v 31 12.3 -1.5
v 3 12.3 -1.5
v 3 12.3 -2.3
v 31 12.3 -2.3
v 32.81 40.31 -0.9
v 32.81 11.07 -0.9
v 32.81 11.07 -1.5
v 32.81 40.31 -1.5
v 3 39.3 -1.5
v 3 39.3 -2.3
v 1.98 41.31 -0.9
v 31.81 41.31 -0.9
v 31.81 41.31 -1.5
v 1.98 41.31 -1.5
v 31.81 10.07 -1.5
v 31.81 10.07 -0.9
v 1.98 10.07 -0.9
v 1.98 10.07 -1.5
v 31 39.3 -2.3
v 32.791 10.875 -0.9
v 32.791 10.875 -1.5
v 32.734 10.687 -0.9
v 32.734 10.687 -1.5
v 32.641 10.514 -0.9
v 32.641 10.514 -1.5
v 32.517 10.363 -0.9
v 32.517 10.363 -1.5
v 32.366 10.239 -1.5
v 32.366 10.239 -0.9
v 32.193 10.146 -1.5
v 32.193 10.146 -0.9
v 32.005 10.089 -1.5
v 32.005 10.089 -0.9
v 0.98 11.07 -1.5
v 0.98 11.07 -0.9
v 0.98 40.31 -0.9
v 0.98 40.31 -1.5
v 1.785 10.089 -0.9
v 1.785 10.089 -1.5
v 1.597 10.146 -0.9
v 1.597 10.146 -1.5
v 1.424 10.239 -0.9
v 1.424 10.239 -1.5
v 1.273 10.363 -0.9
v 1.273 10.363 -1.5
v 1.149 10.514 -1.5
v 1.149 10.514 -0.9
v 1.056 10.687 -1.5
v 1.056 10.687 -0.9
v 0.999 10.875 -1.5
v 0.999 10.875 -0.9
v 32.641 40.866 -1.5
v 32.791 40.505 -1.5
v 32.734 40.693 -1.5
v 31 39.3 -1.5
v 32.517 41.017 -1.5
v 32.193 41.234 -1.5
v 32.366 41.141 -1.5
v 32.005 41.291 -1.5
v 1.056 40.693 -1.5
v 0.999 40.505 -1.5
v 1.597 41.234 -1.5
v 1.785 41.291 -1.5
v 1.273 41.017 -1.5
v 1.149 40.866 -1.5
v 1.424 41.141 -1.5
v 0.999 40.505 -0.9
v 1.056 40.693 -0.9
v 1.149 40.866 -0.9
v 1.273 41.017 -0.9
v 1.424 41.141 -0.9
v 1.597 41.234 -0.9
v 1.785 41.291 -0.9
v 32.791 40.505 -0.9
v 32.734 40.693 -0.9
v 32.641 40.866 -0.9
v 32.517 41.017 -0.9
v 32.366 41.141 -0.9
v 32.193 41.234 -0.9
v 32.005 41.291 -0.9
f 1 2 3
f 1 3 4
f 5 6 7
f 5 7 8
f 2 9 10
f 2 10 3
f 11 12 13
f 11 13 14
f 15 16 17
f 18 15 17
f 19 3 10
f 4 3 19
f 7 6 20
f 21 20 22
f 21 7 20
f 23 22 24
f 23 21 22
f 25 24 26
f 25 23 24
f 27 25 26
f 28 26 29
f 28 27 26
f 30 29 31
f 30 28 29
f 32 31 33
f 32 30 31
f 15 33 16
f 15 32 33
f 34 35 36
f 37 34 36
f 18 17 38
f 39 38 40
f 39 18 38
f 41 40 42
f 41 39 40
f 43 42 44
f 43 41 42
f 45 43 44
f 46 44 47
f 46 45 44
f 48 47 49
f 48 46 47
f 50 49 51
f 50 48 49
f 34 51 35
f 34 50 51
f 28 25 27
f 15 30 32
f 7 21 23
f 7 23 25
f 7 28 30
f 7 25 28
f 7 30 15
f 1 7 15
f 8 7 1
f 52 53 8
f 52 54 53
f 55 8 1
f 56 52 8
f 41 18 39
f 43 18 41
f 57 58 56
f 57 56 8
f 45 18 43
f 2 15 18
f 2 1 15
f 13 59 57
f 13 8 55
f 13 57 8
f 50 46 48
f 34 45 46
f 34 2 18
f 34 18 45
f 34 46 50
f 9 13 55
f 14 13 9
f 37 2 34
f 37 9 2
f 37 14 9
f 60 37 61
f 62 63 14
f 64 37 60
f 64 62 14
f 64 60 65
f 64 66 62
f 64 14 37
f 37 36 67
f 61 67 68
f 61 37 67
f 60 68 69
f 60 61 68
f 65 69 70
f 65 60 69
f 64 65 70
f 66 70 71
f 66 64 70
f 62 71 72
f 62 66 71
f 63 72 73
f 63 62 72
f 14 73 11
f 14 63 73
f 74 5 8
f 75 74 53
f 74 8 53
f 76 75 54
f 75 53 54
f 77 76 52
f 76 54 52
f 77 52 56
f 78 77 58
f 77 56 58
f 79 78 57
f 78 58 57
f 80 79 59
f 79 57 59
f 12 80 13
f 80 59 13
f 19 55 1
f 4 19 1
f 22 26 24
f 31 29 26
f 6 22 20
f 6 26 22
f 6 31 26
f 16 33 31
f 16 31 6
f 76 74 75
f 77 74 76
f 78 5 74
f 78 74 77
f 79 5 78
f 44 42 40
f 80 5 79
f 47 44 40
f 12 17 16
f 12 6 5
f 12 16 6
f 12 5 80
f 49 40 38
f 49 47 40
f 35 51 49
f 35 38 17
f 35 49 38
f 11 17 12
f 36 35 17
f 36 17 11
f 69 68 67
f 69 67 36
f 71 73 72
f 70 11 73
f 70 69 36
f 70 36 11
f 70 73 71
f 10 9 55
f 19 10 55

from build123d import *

# Parameters (mm, degrees)
SKETCH_W     = 31.83
SKETCH_H     = 31.24
PAD_DEPTH    = 1.5
FILLET_R     = 1
POCKET_DEPTH = 0.9
SKETCH028_W  = 28
SKETCH028_H  = 27
PAD021_DEPTH = 0.8


with BuildPart() as part:
    # Sketch → Pad (new body)
    with BuildSketch(Plane(origin=(0, 0, 0), x_dir=(-1, 0, 0), z_dir=(0, 0, -1))):
        with Locations((-16.895, 25.69)):
            Rectangle(SKETCH_W, SKETCH_H)
    extrude(amount=PAD_DEPTH)

    # Fillet
    fillet_edges = [part.edges().sort_by_distance(p)[0] for p in [
        (32.81, 41.31, -0.75),
        (0.98, 41.31, -0.75),
        (0.98, 10.07, -0.75),
        (32.81, 10.07, -0.75),
    ]]
    fillet(fillet_edges, radius=FILLET_R)

    # Fillet Face2 → Pocket (cut)
    with BuildSketch(Plane(origin=(16.895, 25.69, 0), x_dir=(0, 1, 0), z_dir=(0, 0, 1))):
        with BuildLine():
            Line((15.62, -14.915), (15.62, 14.915))
            ThreePointArc((15.62, 14.915), (15.327107, 15.622107), (14.62, 15.915))
            Line((14.62, 15.915), (-14.62, 15.915))
            ThreePointArc((-14.62, 15.915), (-15.327107, 15.622107), (-15.62, 14.915))
            Line((-15.62, 14.915), (-15.62, -14.915))
            ThreePointArc((-15.62, -14.915), (-15.327107, -15.622107), (-14.62, -15.915))
            Line((-14.62, -15.915), (14.62, -15.915))
            ThreePointArc((14.62, -15.915), (15.327107, -15.622107), (15.62, -14.915))
        make_face()
    extrude(amount=-POCKET_DEPTH, mode=Mode.SUBTRACT)

    # Sketch028 (on Face4 of Pocket) → Pad021 (join)
    with BuildSketch(Plane(origin=(0, 0, -1.5), x_dir=(1, 0, 0), z_dir=(0, 0, -1))):
        with Locations((17, -25.8)):
            Rectangle(SKETCH028_W, SKETCH028_H)
    extrude(amount=PAD021_DEPTH)


solid = part.part
